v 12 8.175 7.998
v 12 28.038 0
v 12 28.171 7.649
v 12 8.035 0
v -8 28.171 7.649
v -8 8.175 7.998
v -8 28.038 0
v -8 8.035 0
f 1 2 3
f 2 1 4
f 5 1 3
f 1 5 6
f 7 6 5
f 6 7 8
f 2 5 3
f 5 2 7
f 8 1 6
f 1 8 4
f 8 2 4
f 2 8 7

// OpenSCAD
difference(){
translate([-8,8,-2])rotate([-1,0,0])cube([20,20,10]);
translate([-20,0,-50])cube(50);
}
